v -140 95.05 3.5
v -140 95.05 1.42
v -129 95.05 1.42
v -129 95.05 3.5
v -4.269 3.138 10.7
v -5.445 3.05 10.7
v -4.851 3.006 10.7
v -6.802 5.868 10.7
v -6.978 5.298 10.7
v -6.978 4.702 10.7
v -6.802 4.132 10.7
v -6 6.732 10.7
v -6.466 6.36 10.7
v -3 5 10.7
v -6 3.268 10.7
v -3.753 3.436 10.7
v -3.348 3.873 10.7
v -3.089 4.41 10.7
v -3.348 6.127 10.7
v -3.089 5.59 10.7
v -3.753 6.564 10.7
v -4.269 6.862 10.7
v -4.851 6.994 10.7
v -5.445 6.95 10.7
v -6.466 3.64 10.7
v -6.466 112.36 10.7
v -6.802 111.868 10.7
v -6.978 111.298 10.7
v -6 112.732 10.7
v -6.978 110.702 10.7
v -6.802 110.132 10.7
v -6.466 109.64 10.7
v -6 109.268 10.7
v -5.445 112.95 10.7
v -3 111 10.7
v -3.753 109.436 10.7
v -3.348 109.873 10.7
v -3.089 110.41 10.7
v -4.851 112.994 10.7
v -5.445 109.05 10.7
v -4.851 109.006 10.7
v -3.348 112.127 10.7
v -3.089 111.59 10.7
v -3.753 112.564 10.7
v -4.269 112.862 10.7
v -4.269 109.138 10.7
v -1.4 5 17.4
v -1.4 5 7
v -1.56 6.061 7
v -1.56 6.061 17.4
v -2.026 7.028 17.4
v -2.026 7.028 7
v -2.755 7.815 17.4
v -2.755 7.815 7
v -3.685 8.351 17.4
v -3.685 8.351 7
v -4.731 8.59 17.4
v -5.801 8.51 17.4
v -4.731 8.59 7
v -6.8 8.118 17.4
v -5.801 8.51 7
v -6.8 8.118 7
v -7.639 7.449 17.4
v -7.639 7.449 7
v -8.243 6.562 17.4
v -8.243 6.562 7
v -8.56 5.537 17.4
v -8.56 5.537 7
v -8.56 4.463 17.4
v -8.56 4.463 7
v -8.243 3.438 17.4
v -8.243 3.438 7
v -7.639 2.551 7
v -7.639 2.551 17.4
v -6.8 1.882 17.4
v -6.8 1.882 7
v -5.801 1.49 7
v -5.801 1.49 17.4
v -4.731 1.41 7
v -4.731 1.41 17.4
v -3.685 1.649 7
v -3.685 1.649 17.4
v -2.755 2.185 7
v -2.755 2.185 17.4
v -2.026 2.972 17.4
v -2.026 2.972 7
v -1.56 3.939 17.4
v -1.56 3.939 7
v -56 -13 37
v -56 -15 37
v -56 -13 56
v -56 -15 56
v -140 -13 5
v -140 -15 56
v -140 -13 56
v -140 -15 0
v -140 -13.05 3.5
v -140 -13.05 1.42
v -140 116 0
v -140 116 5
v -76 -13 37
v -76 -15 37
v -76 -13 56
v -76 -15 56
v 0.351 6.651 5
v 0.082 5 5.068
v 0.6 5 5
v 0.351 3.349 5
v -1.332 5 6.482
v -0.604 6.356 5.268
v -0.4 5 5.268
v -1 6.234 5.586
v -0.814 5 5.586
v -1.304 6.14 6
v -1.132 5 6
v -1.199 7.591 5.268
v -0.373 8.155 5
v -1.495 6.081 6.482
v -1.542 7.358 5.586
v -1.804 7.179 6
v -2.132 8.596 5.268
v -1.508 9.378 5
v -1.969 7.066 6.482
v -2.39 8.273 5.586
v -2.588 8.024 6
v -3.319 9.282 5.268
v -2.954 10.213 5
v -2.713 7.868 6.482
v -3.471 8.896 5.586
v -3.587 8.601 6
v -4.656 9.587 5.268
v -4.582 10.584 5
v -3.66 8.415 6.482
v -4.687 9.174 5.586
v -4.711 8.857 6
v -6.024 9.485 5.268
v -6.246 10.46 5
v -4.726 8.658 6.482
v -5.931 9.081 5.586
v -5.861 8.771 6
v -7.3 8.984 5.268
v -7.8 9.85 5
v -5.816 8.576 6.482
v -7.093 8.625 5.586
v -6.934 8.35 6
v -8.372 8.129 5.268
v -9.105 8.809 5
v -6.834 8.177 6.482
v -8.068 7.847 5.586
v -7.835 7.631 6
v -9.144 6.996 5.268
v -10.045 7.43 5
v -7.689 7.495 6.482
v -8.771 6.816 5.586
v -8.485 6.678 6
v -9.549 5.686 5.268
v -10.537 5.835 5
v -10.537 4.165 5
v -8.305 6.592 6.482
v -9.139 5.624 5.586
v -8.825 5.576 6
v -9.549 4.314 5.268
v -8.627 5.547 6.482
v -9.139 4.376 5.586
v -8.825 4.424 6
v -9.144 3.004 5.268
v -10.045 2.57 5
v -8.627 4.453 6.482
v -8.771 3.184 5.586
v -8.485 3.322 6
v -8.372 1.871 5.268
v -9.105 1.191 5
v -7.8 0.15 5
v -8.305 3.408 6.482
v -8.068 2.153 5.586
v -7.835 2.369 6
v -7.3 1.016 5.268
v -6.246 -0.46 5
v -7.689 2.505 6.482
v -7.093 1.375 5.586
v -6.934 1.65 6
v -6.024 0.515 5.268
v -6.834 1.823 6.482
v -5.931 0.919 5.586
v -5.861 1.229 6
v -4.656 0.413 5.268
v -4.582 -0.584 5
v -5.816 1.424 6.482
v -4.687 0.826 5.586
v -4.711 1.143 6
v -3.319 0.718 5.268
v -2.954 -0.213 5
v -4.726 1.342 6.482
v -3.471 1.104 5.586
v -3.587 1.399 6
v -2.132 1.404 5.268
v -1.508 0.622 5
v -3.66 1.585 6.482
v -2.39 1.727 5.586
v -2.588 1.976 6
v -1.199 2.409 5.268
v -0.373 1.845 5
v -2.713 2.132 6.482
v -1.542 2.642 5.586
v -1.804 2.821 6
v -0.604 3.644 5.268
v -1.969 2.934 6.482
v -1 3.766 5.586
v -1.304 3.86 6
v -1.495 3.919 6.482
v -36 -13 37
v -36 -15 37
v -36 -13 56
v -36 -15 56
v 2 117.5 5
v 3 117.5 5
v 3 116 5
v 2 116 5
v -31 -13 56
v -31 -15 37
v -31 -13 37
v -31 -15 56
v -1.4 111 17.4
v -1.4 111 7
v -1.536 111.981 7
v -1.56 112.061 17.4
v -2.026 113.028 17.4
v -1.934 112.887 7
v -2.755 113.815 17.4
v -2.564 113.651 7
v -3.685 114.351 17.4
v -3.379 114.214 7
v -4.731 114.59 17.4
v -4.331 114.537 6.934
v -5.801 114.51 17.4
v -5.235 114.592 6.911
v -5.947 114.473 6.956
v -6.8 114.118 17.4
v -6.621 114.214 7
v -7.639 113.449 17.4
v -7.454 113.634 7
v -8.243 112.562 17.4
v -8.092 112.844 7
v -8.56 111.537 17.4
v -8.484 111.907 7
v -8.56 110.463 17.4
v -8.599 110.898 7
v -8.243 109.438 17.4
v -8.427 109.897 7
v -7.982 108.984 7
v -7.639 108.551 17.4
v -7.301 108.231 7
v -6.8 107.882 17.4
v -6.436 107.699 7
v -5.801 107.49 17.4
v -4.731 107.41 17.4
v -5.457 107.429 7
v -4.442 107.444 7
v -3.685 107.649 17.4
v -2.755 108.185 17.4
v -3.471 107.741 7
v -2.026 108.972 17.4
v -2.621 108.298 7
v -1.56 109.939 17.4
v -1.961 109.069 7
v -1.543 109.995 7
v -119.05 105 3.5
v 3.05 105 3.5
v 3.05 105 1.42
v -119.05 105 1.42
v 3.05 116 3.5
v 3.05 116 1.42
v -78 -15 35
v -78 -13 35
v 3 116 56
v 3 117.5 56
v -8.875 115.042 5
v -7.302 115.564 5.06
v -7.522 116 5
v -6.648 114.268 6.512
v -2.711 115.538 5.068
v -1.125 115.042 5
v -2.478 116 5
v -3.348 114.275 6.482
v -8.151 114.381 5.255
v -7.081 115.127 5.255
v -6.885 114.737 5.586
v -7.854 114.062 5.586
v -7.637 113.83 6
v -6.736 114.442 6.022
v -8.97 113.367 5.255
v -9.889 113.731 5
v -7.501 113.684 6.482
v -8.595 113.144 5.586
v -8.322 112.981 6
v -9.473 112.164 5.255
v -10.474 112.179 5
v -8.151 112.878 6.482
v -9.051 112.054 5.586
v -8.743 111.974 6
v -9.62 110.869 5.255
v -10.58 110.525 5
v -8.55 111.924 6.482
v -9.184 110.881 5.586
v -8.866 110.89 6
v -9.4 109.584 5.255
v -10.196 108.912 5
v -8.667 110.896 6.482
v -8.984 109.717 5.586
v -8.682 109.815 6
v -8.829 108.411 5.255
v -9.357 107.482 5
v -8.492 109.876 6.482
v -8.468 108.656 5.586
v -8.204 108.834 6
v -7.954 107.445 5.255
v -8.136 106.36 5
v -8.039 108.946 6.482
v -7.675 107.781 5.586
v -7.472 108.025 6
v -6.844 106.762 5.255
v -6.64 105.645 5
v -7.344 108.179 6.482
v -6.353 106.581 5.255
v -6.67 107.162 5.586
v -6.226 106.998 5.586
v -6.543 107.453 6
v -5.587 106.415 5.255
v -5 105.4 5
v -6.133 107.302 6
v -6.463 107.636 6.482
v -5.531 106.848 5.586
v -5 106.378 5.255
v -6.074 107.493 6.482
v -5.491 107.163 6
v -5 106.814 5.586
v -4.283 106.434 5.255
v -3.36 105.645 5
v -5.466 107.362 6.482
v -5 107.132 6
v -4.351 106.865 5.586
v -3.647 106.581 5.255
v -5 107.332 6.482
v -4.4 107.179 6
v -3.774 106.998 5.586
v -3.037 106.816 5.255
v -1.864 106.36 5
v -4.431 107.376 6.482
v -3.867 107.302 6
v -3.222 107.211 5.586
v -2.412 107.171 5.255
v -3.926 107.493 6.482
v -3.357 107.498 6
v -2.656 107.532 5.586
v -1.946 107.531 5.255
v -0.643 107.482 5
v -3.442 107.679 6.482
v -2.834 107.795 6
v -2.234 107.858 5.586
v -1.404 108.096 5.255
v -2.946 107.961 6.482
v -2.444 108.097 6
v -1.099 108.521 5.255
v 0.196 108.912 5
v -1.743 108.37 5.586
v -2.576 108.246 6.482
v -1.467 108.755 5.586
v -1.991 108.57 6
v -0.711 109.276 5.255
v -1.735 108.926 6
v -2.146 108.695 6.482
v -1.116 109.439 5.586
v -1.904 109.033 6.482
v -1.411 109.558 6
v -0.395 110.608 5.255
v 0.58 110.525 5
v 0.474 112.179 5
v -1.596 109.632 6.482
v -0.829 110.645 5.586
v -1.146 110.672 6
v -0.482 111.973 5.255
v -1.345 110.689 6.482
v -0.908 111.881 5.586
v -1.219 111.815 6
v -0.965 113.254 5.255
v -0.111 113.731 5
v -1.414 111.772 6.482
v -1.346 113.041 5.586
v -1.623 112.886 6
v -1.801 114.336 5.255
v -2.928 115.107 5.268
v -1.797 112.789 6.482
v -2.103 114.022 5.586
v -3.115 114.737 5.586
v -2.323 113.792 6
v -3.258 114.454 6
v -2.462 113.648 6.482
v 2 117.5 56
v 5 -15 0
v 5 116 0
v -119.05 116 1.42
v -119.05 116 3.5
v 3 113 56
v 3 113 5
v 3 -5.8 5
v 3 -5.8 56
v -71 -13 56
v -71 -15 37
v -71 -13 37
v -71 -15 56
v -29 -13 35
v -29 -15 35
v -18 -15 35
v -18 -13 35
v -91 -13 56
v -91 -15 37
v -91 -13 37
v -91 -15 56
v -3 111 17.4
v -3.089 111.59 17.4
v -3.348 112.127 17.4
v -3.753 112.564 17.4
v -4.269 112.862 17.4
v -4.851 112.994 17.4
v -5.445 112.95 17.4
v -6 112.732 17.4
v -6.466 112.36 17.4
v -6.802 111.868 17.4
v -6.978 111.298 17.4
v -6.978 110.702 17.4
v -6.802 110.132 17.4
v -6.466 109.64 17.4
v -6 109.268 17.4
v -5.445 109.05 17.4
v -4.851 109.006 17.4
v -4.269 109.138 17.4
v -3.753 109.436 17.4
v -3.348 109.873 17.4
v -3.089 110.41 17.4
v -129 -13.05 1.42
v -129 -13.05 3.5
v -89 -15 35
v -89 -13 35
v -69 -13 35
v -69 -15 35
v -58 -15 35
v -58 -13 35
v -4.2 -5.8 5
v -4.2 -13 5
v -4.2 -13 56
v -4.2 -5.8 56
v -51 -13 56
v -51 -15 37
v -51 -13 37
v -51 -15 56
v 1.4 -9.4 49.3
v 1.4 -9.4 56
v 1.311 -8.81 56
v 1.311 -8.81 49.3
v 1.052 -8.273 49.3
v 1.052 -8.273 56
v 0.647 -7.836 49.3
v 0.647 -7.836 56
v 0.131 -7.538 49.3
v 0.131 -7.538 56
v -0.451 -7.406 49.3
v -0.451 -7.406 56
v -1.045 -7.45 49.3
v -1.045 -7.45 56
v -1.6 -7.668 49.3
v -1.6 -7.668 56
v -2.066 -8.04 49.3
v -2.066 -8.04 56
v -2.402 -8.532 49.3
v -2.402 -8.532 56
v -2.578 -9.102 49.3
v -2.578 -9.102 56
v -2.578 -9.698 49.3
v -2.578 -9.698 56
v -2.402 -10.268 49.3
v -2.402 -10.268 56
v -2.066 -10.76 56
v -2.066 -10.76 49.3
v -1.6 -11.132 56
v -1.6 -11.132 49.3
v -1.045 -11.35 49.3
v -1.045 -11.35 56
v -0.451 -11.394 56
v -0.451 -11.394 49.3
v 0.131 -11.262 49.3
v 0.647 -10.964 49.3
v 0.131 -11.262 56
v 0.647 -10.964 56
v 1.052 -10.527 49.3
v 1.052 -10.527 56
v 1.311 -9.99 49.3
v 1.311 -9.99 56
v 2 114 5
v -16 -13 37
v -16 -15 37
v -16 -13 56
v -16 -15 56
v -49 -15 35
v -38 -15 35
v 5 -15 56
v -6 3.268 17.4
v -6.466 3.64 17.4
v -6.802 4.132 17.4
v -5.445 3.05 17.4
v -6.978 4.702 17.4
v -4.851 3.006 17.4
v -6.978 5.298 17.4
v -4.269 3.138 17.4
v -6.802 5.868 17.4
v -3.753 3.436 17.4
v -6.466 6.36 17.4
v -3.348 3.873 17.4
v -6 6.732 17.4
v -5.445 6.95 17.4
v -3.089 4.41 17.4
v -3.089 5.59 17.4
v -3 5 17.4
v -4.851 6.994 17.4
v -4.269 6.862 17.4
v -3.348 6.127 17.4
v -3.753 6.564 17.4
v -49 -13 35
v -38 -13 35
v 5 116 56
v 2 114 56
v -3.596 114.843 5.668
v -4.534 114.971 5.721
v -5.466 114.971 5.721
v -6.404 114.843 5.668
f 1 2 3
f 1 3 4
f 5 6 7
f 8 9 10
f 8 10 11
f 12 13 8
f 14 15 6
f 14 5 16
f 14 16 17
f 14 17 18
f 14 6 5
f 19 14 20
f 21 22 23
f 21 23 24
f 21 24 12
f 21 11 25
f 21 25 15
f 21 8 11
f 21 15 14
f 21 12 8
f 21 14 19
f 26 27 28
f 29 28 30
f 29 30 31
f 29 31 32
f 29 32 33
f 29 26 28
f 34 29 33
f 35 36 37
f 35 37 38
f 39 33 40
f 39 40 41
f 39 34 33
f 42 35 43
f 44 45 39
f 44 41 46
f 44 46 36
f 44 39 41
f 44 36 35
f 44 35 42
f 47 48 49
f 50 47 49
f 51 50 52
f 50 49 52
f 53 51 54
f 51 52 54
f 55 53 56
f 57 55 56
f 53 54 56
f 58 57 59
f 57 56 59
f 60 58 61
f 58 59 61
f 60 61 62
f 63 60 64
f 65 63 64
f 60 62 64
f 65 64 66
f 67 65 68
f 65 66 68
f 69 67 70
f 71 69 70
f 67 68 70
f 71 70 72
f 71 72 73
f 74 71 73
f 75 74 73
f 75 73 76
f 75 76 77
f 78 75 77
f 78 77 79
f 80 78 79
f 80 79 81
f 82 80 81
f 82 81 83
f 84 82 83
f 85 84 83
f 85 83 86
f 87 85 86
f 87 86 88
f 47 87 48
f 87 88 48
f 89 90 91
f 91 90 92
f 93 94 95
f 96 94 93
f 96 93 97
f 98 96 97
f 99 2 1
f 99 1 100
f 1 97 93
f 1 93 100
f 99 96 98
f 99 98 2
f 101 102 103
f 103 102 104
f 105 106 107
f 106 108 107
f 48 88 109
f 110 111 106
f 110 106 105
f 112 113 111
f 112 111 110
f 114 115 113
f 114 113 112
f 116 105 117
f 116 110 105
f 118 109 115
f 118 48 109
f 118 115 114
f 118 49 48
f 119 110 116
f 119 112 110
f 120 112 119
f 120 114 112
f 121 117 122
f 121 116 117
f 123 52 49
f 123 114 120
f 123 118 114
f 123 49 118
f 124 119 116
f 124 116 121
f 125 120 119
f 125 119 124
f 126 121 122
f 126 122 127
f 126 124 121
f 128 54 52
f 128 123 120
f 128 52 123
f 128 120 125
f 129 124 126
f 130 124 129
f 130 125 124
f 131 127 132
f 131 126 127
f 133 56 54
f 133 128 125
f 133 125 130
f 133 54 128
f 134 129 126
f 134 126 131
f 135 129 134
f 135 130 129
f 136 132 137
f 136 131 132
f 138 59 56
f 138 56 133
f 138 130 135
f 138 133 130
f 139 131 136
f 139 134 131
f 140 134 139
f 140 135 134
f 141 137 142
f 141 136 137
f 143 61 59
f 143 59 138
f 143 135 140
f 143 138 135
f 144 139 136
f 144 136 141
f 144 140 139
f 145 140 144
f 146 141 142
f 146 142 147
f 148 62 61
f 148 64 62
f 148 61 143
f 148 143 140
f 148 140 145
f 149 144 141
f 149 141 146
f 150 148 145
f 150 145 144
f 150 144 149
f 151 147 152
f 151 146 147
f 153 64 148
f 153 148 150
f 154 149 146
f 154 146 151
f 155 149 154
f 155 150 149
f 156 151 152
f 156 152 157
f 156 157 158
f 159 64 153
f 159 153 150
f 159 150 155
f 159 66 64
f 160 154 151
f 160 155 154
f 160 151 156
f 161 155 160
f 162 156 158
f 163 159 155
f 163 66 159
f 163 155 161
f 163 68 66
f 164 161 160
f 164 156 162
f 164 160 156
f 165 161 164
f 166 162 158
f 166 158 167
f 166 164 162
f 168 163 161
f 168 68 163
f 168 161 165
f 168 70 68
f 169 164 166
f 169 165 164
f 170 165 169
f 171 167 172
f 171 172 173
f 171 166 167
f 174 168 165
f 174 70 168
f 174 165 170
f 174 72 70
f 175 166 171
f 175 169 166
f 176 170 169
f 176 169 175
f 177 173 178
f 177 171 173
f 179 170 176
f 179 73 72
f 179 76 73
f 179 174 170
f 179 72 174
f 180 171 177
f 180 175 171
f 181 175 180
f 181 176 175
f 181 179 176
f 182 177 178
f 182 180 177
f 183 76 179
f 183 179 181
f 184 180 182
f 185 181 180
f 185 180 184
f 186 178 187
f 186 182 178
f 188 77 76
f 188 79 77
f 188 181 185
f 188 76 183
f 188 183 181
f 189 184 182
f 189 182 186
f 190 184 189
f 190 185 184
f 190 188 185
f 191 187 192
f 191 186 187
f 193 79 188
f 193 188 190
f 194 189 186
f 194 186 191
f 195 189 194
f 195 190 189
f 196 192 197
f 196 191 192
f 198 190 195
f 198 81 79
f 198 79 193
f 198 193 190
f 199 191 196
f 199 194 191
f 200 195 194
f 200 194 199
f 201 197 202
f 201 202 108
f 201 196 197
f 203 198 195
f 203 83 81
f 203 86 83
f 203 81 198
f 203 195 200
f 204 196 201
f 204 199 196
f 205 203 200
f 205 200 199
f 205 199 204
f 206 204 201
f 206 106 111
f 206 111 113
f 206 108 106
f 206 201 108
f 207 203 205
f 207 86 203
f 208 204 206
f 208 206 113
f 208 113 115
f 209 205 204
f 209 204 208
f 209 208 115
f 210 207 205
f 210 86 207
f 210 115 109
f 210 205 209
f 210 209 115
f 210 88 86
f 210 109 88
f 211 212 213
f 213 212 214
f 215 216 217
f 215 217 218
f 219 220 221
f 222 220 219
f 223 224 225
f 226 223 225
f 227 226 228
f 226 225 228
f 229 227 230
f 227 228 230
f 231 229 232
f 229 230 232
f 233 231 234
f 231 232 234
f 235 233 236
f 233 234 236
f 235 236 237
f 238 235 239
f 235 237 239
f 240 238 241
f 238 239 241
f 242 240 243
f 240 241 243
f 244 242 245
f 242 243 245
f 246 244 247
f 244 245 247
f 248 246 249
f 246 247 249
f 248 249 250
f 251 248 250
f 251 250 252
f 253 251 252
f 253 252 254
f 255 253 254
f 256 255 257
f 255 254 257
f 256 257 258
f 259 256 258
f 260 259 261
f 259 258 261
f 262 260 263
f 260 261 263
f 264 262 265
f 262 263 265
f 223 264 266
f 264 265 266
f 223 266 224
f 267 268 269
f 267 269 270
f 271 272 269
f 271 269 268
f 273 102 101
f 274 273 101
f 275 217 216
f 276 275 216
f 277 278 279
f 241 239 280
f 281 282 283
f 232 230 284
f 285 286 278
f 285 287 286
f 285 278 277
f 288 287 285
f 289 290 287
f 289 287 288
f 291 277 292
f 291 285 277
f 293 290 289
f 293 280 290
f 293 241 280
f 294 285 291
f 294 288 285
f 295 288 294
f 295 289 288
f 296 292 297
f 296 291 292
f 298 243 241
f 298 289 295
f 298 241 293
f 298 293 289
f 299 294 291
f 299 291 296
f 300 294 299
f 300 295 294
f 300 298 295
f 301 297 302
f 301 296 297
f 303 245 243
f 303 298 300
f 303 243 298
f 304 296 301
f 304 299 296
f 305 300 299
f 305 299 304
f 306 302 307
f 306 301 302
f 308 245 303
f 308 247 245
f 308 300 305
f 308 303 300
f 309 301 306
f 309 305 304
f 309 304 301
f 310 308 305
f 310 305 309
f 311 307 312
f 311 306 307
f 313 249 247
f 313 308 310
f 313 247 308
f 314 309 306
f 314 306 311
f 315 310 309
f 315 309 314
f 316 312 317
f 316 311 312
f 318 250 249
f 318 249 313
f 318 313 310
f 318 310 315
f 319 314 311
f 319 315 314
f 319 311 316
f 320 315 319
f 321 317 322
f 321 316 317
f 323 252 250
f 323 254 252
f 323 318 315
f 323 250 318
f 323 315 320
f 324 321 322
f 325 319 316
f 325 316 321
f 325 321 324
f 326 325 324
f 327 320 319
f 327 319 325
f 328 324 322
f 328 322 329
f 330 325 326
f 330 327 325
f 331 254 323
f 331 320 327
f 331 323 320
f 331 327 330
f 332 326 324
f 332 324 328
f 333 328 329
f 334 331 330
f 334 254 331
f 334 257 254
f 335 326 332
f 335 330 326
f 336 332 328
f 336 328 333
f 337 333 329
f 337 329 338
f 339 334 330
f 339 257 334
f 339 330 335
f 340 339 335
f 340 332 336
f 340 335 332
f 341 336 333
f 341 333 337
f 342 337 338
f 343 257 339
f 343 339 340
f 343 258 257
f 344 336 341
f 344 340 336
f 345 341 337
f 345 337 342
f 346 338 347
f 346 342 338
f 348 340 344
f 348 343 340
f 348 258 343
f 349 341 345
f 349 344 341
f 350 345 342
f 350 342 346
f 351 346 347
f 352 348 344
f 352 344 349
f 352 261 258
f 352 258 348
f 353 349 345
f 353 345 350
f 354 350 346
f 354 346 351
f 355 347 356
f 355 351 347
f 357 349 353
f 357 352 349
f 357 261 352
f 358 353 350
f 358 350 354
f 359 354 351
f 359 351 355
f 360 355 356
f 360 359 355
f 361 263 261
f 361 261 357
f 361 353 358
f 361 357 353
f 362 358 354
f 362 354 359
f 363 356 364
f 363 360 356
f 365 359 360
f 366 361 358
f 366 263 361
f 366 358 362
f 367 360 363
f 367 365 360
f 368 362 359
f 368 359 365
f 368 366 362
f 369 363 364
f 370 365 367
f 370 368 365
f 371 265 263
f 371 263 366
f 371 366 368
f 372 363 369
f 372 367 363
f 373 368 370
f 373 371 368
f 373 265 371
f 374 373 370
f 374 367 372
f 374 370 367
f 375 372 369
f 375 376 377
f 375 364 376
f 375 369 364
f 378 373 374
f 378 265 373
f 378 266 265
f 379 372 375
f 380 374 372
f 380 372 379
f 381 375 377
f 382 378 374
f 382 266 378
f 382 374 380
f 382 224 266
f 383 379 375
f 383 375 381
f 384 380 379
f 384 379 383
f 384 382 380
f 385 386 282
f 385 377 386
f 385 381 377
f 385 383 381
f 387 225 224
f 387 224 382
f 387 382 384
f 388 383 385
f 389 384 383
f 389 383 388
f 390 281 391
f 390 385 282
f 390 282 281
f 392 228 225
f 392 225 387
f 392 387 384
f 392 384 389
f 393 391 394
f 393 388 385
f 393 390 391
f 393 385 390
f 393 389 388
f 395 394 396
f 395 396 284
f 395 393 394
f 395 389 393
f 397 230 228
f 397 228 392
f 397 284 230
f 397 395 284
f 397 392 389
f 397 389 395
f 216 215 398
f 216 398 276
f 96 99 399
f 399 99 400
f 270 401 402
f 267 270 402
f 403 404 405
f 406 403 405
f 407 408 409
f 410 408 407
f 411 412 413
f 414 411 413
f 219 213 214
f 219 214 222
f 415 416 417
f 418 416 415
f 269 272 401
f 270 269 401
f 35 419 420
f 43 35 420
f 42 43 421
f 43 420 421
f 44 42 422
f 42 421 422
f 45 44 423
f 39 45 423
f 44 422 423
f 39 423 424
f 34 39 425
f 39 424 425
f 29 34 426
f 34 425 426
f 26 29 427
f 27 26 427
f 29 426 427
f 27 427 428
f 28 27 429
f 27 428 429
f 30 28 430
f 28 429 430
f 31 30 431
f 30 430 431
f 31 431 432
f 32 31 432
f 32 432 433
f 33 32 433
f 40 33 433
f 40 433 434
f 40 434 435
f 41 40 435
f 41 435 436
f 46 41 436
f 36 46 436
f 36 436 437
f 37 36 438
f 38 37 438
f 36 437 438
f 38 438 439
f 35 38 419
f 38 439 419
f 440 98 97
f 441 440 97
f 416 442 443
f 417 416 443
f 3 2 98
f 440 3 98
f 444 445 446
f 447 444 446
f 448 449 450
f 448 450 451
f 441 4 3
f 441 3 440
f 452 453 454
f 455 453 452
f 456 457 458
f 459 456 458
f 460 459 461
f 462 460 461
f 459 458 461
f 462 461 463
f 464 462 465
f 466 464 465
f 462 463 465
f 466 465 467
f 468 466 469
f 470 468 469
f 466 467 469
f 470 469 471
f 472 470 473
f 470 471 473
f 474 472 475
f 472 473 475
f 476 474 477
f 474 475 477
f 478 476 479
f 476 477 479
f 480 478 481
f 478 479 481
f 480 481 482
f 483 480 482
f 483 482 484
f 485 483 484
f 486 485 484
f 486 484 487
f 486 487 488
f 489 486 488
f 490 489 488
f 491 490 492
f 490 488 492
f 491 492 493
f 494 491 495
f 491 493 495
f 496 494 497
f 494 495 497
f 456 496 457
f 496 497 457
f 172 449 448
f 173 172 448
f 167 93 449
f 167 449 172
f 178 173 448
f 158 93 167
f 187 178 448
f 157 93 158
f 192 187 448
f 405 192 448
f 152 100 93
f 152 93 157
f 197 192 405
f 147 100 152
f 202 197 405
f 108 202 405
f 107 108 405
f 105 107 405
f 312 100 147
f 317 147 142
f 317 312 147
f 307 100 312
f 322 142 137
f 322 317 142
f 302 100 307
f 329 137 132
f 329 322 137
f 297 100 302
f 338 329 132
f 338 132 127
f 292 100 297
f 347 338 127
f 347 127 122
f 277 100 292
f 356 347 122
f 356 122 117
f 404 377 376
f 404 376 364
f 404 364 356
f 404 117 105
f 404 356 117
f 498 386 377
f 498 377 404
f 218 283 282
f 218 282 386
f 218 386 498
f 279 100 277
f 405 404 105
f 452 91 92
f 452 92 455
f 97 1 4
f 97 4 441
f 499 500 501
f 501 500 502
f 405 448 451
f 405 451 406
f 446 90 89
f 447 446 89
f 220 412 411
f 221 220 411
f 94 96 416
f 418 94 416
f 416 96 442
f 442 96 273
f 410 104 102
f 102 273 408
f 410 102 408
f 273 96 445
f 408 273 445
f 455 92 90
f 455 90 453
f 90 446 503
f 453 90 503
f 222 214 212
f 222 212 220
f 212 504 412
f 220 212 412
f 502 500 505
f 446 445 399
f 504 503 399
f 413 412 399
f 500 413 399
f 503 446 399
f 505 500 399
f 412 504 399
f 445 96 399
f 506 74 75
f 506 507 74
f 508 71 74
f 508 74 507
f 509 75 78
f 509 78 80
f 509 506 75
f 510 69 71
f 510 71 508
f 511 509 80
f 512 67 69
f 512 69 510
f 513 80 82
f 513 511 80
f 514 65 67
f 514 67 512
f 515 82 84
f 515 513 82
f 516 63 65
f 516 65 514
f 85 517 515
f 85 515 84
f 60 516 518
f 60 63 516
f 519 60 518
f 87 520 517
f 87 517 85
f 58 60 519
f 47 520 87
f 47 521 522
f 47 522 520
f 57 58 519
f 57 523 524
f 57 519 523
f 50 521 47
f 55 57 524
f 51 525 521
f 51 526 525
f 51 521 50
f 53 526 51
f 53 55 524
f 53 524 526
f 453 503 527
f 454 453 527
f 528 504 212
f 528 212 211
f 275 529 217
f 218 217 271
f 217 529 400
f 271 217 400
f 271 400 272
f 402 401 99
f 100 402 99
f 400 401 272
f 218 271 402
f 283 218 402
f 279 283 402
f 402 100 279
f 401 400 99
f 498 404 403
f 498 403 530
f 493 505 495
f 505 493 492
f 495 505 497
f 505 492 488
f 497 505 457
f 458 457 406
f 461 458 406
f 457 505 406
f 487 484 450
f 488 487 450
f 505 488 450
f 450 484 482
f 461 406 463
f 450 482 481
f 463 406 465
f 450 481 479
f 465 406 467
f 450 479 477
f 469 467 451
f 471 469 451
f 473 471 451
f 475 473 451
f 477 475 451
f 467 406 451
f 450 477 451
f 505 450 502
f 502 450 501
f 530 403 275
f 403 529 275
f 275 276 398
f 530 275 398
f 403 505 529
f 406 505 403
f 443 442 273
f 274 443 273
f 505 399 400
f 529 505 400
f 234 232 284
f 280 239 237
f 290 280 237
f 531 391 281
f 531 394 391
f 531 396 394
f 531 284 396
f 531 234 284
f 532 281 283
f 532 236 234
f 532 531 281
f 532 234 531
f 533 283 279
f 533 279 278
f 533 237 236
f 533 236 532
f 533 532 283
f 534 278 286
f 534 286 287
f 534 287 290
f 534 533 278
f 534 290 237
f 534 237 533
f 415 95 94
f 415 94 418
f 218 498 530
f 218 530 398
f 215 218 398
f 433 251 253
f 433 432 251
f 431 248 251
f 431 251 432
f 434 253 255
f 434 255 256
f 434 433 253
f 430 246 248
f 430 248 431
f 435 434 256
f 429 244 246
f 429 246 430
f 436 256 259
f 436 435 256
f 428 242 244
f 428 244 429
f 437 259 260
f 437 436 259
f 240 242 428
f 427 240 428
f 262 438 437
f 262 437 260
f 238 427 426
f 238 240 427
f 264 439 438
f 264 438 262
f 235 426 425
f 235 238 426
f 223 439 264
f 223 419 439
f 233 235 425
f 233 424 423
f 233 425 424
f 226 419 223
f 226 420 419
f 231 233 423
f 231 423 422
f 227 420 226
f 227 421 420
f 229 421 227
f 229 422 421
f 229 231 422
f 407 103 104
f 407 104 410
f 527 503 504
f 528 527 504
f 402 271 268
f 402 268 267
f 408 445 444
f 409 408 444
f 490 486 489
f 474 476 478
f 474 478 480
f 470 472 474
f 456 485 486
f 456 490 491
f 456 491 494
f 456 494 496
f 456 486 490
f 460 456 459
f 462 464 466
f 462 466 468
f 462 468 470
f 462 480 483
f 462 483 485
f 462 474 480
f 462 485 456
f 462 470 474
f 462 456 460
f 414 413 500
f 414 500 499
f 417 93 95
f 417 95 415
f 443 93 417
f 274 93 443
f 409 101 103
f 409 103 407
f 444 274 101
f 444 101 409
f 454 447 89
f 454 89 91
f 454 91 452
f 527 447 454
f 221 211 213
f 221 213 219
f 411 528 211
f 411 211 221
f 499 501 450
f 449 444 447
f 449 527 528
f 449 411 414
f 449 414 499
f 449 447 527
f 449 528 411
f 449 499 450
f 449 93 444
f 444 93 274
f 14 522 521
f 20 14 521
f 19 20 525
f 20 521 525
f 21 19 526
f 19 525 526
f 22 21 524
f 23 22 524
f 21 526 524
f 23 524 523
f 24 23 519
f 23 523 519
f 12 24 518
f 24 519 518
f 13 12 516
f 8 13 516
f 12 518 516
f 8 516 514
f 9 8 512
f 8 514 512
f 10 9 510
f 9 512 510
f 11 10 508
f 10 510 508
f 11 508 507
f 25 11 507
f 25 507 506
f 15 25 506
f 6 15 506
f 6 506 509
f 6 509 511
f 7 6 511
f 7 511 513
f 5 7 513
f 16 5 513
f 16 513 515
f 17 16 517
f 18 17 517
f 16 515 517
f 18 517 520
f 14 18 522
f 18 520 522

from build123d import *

# Parameters (mm, degrees)
SKETCH_1_W      = 140
SKETCH_1_H      = 116
PAD_DEPTH       = 5
SKETCH_W        = 140
SKETCH_H        = 15
PAD001_DEPTH    = 5
SKETCH001_W     = 107
SKETCH001_H     = 2
PAD002_DEPTH    = 51
SKETCH002_W     = 15
SKETCH002_H     = 41
POCKET_DEPTH    = 2
SKETCH003_W     = 5
SKETCH003_H     = 131
PAD003_DEPTH    = 5
PAD004_DEPTH    = 51
SKETCH005_W     = 33
SKETCH005_H     = 2
PAD005_DEPTH    = 51
SKETCH006_R     = 3.6
PAD006_DEPTH    = 12.4
SKETCH007_R     = 2
POCKET001_DEPTH = 6.7
SKETCH008_W     = 122.1
SKETCH008_H     = 2.08
POCKET002_DEPTH = 11
SKETCH009_W     = 108.1
SKETCH009_H     = 2.08
POCKET003_DEPTH = 11
SKETCH010_W     = 7.2
SKETCH010_H     = 7.2
PAD007_DEPTH    = 51
SKETCH011_R     = 2
POCKET004_DEPTH = 6.7
PAD008_DEPTH    = 51
FILLET_R        = 2
CHAMFER_SIZE    = 2


with BuildPart() as part:
    # Sketch_1 → Pad (new body)
    with BuildSketch(Plane.XY):
        with Locations((-70, 58)):
            Rectangle(SKETCH_1_W, SKETCH_1_H)
    extrude(amount=PAD_DEPTH)

    # Sketch → Pad001 (join)
    with BuildSketch(Plane.XY):
        with Locations((-70, -7.5)):
            Rectangle(SKETCH_W, SKETCH_H)
    extrude(amount=PAD001_DEPTH)

    # Sketch001 (on Face8 of Pad001) → Pad002 (join)
    with BuildSketch(Plane.XY.offset(5)):
        with Locations((-53.5, -14)):
            Rectangle(SKETCH001_W, SKETCH001_H)
    extrude(amount=PAD002_DEPTH)

    # Sketch002 (on Face11 of Pad002) → Pocket (cut)
    with BuildSketch(Plane.XZ.offset(15)):
        with Locations((-23.5, 55.5)):
            Rectangle(SKETCH002_W, SKETCH002_H)
        with Locations((-43.5, 55.5)):
            Rectangle(SKETCH002_W, SKETCH002_H)
        with Locations((-63.5, 55.5)):
            Rectangle(SKETCH002_W, SKETCH002_H)
        with Locations((-83.5, 55.5)):
            Rectangle(SKETCH002_W, SKETCH002_H)
    extrude(amount=-POCKET_DEPTH, mode=Mode.SUBTRACT)

    # Sketch003 → Pad003 (join)
    with BuildSketch(Plane.XY):
        with Locations((2.5, 50.5)):
            Rectangle(SKETCH003_W, SKETCH003_H)
    extrude(amount=PAD003_DEPTH)

    # Sketch004 (on Face11 of Pad003) → Pad004 (join)
    with BuildSketch(Plane.XY.offset(5)):
        Polygon((5, 116), (3, 116), (3, -13), (0, -13), (0, -15), (5, -15), align=None)
    extrude(amount=PAD004_DEPTH)

    # Sketch005 (on Face8 of Pad004) → Pad005 (join)
    with BuildSketch(Plane.XY.offset(5)):
        with Locations((-123.5, -14)):
            Rectangle(SKETCH005_W, SKETCH005_H)
    extrude(amount=PAD005_DEPTH)

    # Sketch006 (on Face5 of Pad005) → Pad006 (join)
    with BuildSketch(Plane.XY.offset(5)):
        with Locations((-5, 5)):
            Circle(SKETCH006_R)
        with Locations((-5, 111)):
            Circle(SKETCH006_R)
    extrude(amount=PAD006_DEPTH)

    # Sketch007 (on Face25 of Pad006) → Pocket001 (cut)
    with BuildSketch(Plane.XY.offset(17.4)):
        with Locations((-5, 5)):
            Circle(SKETCH007_R)
        with Locations((-5, 111)):
            Circle(SKETCH007_R)
    extrude(amount=-POCKET001_DEPTH, mode=Mode.SUBTRACT)

    # Sketch008 (on Face3 of Pocket001) → Pocket002 (cut)
    with BuildSketch(Plane(origin=(0, 116, 0), x_dir=(-1, 0, 0), z_dir=(0, 1, 0))):
        with Locations((58, 2.46)):
            Rectangle(SKETCH008_W, SKETCH008_H)
    extrude(amount=-POCKET002_DEPTH, mode=Mode.SUBTRACT)

    # Sketch009 (on Face1 of Pocket002) → Pocket003 (cut)
    with BuildSketch(Plane(origin=(-140, 0, 0), x_dir=(0, -1, 0), z_dir=(-1, 0, 0))):
        with Locations((-41, 2.46)):
            Rectangle(SKETCH009_W, SKETCH009_H)
    extrude(amount=-POCKET003_DEPTH, mode=Mode.SUBTRACT)

    # Sketch010 (on Face16 of Pocket003) → Pad007 (join)
    with BuildSketch(Plane.XY.offset(5)):
        with Locations((-0.6, -9.4)):
            Rectangle(SKETCH010_W, SKETCH010_H)
    extrude(amount=PAD007_DEPTH)

    # Sketch011 (on Face41 of Pad007) → Pocket004 (cut)
    with BuildSketch(Plane.XY.offset(56)):
        with Locations((-0.6, -9.4)):
            Circle(SKETCH011_R)
    extrude(amount=-POCKET004_DEPTH, mode=Mode.SUBTRACT)

    # Sketch012 (on Face16 of Pocket004) → Pad008 (join)
    with BuildSketch(Plane.XY.offset(5)):
        Polygon((3, 116), (3, 114), (3, 113), (2, 114), (2, 117.5), (3, 117.5), align=None)
    extrude(amount=PAD008_DEPTH)

    # Fillet
    fillet_edges = [part.edges().sort_by_distance(p)[0] for p in [
        (-8.6, 5, 5),
        (-8.6, 111, 5),
    ]]
    fillet(fillet_edges, radius=FILLET_R)

    # Chamfer
    chamfer_edges = [part.edges().sort_by_distance(p)[0] for p in [
        (-91, -14, 35),
        (-71, -14, 35),
        (-76, -14, 35),
        (-56, -14, 35),
        (-51, -14, 35),
        (-36, -14, 35),
        (-31, -14, 35),
        (-16, -14, 35),
    ]]
    chamfer(chamfer_edges, length=CHAMFER_SIZE)


solid = part.part
